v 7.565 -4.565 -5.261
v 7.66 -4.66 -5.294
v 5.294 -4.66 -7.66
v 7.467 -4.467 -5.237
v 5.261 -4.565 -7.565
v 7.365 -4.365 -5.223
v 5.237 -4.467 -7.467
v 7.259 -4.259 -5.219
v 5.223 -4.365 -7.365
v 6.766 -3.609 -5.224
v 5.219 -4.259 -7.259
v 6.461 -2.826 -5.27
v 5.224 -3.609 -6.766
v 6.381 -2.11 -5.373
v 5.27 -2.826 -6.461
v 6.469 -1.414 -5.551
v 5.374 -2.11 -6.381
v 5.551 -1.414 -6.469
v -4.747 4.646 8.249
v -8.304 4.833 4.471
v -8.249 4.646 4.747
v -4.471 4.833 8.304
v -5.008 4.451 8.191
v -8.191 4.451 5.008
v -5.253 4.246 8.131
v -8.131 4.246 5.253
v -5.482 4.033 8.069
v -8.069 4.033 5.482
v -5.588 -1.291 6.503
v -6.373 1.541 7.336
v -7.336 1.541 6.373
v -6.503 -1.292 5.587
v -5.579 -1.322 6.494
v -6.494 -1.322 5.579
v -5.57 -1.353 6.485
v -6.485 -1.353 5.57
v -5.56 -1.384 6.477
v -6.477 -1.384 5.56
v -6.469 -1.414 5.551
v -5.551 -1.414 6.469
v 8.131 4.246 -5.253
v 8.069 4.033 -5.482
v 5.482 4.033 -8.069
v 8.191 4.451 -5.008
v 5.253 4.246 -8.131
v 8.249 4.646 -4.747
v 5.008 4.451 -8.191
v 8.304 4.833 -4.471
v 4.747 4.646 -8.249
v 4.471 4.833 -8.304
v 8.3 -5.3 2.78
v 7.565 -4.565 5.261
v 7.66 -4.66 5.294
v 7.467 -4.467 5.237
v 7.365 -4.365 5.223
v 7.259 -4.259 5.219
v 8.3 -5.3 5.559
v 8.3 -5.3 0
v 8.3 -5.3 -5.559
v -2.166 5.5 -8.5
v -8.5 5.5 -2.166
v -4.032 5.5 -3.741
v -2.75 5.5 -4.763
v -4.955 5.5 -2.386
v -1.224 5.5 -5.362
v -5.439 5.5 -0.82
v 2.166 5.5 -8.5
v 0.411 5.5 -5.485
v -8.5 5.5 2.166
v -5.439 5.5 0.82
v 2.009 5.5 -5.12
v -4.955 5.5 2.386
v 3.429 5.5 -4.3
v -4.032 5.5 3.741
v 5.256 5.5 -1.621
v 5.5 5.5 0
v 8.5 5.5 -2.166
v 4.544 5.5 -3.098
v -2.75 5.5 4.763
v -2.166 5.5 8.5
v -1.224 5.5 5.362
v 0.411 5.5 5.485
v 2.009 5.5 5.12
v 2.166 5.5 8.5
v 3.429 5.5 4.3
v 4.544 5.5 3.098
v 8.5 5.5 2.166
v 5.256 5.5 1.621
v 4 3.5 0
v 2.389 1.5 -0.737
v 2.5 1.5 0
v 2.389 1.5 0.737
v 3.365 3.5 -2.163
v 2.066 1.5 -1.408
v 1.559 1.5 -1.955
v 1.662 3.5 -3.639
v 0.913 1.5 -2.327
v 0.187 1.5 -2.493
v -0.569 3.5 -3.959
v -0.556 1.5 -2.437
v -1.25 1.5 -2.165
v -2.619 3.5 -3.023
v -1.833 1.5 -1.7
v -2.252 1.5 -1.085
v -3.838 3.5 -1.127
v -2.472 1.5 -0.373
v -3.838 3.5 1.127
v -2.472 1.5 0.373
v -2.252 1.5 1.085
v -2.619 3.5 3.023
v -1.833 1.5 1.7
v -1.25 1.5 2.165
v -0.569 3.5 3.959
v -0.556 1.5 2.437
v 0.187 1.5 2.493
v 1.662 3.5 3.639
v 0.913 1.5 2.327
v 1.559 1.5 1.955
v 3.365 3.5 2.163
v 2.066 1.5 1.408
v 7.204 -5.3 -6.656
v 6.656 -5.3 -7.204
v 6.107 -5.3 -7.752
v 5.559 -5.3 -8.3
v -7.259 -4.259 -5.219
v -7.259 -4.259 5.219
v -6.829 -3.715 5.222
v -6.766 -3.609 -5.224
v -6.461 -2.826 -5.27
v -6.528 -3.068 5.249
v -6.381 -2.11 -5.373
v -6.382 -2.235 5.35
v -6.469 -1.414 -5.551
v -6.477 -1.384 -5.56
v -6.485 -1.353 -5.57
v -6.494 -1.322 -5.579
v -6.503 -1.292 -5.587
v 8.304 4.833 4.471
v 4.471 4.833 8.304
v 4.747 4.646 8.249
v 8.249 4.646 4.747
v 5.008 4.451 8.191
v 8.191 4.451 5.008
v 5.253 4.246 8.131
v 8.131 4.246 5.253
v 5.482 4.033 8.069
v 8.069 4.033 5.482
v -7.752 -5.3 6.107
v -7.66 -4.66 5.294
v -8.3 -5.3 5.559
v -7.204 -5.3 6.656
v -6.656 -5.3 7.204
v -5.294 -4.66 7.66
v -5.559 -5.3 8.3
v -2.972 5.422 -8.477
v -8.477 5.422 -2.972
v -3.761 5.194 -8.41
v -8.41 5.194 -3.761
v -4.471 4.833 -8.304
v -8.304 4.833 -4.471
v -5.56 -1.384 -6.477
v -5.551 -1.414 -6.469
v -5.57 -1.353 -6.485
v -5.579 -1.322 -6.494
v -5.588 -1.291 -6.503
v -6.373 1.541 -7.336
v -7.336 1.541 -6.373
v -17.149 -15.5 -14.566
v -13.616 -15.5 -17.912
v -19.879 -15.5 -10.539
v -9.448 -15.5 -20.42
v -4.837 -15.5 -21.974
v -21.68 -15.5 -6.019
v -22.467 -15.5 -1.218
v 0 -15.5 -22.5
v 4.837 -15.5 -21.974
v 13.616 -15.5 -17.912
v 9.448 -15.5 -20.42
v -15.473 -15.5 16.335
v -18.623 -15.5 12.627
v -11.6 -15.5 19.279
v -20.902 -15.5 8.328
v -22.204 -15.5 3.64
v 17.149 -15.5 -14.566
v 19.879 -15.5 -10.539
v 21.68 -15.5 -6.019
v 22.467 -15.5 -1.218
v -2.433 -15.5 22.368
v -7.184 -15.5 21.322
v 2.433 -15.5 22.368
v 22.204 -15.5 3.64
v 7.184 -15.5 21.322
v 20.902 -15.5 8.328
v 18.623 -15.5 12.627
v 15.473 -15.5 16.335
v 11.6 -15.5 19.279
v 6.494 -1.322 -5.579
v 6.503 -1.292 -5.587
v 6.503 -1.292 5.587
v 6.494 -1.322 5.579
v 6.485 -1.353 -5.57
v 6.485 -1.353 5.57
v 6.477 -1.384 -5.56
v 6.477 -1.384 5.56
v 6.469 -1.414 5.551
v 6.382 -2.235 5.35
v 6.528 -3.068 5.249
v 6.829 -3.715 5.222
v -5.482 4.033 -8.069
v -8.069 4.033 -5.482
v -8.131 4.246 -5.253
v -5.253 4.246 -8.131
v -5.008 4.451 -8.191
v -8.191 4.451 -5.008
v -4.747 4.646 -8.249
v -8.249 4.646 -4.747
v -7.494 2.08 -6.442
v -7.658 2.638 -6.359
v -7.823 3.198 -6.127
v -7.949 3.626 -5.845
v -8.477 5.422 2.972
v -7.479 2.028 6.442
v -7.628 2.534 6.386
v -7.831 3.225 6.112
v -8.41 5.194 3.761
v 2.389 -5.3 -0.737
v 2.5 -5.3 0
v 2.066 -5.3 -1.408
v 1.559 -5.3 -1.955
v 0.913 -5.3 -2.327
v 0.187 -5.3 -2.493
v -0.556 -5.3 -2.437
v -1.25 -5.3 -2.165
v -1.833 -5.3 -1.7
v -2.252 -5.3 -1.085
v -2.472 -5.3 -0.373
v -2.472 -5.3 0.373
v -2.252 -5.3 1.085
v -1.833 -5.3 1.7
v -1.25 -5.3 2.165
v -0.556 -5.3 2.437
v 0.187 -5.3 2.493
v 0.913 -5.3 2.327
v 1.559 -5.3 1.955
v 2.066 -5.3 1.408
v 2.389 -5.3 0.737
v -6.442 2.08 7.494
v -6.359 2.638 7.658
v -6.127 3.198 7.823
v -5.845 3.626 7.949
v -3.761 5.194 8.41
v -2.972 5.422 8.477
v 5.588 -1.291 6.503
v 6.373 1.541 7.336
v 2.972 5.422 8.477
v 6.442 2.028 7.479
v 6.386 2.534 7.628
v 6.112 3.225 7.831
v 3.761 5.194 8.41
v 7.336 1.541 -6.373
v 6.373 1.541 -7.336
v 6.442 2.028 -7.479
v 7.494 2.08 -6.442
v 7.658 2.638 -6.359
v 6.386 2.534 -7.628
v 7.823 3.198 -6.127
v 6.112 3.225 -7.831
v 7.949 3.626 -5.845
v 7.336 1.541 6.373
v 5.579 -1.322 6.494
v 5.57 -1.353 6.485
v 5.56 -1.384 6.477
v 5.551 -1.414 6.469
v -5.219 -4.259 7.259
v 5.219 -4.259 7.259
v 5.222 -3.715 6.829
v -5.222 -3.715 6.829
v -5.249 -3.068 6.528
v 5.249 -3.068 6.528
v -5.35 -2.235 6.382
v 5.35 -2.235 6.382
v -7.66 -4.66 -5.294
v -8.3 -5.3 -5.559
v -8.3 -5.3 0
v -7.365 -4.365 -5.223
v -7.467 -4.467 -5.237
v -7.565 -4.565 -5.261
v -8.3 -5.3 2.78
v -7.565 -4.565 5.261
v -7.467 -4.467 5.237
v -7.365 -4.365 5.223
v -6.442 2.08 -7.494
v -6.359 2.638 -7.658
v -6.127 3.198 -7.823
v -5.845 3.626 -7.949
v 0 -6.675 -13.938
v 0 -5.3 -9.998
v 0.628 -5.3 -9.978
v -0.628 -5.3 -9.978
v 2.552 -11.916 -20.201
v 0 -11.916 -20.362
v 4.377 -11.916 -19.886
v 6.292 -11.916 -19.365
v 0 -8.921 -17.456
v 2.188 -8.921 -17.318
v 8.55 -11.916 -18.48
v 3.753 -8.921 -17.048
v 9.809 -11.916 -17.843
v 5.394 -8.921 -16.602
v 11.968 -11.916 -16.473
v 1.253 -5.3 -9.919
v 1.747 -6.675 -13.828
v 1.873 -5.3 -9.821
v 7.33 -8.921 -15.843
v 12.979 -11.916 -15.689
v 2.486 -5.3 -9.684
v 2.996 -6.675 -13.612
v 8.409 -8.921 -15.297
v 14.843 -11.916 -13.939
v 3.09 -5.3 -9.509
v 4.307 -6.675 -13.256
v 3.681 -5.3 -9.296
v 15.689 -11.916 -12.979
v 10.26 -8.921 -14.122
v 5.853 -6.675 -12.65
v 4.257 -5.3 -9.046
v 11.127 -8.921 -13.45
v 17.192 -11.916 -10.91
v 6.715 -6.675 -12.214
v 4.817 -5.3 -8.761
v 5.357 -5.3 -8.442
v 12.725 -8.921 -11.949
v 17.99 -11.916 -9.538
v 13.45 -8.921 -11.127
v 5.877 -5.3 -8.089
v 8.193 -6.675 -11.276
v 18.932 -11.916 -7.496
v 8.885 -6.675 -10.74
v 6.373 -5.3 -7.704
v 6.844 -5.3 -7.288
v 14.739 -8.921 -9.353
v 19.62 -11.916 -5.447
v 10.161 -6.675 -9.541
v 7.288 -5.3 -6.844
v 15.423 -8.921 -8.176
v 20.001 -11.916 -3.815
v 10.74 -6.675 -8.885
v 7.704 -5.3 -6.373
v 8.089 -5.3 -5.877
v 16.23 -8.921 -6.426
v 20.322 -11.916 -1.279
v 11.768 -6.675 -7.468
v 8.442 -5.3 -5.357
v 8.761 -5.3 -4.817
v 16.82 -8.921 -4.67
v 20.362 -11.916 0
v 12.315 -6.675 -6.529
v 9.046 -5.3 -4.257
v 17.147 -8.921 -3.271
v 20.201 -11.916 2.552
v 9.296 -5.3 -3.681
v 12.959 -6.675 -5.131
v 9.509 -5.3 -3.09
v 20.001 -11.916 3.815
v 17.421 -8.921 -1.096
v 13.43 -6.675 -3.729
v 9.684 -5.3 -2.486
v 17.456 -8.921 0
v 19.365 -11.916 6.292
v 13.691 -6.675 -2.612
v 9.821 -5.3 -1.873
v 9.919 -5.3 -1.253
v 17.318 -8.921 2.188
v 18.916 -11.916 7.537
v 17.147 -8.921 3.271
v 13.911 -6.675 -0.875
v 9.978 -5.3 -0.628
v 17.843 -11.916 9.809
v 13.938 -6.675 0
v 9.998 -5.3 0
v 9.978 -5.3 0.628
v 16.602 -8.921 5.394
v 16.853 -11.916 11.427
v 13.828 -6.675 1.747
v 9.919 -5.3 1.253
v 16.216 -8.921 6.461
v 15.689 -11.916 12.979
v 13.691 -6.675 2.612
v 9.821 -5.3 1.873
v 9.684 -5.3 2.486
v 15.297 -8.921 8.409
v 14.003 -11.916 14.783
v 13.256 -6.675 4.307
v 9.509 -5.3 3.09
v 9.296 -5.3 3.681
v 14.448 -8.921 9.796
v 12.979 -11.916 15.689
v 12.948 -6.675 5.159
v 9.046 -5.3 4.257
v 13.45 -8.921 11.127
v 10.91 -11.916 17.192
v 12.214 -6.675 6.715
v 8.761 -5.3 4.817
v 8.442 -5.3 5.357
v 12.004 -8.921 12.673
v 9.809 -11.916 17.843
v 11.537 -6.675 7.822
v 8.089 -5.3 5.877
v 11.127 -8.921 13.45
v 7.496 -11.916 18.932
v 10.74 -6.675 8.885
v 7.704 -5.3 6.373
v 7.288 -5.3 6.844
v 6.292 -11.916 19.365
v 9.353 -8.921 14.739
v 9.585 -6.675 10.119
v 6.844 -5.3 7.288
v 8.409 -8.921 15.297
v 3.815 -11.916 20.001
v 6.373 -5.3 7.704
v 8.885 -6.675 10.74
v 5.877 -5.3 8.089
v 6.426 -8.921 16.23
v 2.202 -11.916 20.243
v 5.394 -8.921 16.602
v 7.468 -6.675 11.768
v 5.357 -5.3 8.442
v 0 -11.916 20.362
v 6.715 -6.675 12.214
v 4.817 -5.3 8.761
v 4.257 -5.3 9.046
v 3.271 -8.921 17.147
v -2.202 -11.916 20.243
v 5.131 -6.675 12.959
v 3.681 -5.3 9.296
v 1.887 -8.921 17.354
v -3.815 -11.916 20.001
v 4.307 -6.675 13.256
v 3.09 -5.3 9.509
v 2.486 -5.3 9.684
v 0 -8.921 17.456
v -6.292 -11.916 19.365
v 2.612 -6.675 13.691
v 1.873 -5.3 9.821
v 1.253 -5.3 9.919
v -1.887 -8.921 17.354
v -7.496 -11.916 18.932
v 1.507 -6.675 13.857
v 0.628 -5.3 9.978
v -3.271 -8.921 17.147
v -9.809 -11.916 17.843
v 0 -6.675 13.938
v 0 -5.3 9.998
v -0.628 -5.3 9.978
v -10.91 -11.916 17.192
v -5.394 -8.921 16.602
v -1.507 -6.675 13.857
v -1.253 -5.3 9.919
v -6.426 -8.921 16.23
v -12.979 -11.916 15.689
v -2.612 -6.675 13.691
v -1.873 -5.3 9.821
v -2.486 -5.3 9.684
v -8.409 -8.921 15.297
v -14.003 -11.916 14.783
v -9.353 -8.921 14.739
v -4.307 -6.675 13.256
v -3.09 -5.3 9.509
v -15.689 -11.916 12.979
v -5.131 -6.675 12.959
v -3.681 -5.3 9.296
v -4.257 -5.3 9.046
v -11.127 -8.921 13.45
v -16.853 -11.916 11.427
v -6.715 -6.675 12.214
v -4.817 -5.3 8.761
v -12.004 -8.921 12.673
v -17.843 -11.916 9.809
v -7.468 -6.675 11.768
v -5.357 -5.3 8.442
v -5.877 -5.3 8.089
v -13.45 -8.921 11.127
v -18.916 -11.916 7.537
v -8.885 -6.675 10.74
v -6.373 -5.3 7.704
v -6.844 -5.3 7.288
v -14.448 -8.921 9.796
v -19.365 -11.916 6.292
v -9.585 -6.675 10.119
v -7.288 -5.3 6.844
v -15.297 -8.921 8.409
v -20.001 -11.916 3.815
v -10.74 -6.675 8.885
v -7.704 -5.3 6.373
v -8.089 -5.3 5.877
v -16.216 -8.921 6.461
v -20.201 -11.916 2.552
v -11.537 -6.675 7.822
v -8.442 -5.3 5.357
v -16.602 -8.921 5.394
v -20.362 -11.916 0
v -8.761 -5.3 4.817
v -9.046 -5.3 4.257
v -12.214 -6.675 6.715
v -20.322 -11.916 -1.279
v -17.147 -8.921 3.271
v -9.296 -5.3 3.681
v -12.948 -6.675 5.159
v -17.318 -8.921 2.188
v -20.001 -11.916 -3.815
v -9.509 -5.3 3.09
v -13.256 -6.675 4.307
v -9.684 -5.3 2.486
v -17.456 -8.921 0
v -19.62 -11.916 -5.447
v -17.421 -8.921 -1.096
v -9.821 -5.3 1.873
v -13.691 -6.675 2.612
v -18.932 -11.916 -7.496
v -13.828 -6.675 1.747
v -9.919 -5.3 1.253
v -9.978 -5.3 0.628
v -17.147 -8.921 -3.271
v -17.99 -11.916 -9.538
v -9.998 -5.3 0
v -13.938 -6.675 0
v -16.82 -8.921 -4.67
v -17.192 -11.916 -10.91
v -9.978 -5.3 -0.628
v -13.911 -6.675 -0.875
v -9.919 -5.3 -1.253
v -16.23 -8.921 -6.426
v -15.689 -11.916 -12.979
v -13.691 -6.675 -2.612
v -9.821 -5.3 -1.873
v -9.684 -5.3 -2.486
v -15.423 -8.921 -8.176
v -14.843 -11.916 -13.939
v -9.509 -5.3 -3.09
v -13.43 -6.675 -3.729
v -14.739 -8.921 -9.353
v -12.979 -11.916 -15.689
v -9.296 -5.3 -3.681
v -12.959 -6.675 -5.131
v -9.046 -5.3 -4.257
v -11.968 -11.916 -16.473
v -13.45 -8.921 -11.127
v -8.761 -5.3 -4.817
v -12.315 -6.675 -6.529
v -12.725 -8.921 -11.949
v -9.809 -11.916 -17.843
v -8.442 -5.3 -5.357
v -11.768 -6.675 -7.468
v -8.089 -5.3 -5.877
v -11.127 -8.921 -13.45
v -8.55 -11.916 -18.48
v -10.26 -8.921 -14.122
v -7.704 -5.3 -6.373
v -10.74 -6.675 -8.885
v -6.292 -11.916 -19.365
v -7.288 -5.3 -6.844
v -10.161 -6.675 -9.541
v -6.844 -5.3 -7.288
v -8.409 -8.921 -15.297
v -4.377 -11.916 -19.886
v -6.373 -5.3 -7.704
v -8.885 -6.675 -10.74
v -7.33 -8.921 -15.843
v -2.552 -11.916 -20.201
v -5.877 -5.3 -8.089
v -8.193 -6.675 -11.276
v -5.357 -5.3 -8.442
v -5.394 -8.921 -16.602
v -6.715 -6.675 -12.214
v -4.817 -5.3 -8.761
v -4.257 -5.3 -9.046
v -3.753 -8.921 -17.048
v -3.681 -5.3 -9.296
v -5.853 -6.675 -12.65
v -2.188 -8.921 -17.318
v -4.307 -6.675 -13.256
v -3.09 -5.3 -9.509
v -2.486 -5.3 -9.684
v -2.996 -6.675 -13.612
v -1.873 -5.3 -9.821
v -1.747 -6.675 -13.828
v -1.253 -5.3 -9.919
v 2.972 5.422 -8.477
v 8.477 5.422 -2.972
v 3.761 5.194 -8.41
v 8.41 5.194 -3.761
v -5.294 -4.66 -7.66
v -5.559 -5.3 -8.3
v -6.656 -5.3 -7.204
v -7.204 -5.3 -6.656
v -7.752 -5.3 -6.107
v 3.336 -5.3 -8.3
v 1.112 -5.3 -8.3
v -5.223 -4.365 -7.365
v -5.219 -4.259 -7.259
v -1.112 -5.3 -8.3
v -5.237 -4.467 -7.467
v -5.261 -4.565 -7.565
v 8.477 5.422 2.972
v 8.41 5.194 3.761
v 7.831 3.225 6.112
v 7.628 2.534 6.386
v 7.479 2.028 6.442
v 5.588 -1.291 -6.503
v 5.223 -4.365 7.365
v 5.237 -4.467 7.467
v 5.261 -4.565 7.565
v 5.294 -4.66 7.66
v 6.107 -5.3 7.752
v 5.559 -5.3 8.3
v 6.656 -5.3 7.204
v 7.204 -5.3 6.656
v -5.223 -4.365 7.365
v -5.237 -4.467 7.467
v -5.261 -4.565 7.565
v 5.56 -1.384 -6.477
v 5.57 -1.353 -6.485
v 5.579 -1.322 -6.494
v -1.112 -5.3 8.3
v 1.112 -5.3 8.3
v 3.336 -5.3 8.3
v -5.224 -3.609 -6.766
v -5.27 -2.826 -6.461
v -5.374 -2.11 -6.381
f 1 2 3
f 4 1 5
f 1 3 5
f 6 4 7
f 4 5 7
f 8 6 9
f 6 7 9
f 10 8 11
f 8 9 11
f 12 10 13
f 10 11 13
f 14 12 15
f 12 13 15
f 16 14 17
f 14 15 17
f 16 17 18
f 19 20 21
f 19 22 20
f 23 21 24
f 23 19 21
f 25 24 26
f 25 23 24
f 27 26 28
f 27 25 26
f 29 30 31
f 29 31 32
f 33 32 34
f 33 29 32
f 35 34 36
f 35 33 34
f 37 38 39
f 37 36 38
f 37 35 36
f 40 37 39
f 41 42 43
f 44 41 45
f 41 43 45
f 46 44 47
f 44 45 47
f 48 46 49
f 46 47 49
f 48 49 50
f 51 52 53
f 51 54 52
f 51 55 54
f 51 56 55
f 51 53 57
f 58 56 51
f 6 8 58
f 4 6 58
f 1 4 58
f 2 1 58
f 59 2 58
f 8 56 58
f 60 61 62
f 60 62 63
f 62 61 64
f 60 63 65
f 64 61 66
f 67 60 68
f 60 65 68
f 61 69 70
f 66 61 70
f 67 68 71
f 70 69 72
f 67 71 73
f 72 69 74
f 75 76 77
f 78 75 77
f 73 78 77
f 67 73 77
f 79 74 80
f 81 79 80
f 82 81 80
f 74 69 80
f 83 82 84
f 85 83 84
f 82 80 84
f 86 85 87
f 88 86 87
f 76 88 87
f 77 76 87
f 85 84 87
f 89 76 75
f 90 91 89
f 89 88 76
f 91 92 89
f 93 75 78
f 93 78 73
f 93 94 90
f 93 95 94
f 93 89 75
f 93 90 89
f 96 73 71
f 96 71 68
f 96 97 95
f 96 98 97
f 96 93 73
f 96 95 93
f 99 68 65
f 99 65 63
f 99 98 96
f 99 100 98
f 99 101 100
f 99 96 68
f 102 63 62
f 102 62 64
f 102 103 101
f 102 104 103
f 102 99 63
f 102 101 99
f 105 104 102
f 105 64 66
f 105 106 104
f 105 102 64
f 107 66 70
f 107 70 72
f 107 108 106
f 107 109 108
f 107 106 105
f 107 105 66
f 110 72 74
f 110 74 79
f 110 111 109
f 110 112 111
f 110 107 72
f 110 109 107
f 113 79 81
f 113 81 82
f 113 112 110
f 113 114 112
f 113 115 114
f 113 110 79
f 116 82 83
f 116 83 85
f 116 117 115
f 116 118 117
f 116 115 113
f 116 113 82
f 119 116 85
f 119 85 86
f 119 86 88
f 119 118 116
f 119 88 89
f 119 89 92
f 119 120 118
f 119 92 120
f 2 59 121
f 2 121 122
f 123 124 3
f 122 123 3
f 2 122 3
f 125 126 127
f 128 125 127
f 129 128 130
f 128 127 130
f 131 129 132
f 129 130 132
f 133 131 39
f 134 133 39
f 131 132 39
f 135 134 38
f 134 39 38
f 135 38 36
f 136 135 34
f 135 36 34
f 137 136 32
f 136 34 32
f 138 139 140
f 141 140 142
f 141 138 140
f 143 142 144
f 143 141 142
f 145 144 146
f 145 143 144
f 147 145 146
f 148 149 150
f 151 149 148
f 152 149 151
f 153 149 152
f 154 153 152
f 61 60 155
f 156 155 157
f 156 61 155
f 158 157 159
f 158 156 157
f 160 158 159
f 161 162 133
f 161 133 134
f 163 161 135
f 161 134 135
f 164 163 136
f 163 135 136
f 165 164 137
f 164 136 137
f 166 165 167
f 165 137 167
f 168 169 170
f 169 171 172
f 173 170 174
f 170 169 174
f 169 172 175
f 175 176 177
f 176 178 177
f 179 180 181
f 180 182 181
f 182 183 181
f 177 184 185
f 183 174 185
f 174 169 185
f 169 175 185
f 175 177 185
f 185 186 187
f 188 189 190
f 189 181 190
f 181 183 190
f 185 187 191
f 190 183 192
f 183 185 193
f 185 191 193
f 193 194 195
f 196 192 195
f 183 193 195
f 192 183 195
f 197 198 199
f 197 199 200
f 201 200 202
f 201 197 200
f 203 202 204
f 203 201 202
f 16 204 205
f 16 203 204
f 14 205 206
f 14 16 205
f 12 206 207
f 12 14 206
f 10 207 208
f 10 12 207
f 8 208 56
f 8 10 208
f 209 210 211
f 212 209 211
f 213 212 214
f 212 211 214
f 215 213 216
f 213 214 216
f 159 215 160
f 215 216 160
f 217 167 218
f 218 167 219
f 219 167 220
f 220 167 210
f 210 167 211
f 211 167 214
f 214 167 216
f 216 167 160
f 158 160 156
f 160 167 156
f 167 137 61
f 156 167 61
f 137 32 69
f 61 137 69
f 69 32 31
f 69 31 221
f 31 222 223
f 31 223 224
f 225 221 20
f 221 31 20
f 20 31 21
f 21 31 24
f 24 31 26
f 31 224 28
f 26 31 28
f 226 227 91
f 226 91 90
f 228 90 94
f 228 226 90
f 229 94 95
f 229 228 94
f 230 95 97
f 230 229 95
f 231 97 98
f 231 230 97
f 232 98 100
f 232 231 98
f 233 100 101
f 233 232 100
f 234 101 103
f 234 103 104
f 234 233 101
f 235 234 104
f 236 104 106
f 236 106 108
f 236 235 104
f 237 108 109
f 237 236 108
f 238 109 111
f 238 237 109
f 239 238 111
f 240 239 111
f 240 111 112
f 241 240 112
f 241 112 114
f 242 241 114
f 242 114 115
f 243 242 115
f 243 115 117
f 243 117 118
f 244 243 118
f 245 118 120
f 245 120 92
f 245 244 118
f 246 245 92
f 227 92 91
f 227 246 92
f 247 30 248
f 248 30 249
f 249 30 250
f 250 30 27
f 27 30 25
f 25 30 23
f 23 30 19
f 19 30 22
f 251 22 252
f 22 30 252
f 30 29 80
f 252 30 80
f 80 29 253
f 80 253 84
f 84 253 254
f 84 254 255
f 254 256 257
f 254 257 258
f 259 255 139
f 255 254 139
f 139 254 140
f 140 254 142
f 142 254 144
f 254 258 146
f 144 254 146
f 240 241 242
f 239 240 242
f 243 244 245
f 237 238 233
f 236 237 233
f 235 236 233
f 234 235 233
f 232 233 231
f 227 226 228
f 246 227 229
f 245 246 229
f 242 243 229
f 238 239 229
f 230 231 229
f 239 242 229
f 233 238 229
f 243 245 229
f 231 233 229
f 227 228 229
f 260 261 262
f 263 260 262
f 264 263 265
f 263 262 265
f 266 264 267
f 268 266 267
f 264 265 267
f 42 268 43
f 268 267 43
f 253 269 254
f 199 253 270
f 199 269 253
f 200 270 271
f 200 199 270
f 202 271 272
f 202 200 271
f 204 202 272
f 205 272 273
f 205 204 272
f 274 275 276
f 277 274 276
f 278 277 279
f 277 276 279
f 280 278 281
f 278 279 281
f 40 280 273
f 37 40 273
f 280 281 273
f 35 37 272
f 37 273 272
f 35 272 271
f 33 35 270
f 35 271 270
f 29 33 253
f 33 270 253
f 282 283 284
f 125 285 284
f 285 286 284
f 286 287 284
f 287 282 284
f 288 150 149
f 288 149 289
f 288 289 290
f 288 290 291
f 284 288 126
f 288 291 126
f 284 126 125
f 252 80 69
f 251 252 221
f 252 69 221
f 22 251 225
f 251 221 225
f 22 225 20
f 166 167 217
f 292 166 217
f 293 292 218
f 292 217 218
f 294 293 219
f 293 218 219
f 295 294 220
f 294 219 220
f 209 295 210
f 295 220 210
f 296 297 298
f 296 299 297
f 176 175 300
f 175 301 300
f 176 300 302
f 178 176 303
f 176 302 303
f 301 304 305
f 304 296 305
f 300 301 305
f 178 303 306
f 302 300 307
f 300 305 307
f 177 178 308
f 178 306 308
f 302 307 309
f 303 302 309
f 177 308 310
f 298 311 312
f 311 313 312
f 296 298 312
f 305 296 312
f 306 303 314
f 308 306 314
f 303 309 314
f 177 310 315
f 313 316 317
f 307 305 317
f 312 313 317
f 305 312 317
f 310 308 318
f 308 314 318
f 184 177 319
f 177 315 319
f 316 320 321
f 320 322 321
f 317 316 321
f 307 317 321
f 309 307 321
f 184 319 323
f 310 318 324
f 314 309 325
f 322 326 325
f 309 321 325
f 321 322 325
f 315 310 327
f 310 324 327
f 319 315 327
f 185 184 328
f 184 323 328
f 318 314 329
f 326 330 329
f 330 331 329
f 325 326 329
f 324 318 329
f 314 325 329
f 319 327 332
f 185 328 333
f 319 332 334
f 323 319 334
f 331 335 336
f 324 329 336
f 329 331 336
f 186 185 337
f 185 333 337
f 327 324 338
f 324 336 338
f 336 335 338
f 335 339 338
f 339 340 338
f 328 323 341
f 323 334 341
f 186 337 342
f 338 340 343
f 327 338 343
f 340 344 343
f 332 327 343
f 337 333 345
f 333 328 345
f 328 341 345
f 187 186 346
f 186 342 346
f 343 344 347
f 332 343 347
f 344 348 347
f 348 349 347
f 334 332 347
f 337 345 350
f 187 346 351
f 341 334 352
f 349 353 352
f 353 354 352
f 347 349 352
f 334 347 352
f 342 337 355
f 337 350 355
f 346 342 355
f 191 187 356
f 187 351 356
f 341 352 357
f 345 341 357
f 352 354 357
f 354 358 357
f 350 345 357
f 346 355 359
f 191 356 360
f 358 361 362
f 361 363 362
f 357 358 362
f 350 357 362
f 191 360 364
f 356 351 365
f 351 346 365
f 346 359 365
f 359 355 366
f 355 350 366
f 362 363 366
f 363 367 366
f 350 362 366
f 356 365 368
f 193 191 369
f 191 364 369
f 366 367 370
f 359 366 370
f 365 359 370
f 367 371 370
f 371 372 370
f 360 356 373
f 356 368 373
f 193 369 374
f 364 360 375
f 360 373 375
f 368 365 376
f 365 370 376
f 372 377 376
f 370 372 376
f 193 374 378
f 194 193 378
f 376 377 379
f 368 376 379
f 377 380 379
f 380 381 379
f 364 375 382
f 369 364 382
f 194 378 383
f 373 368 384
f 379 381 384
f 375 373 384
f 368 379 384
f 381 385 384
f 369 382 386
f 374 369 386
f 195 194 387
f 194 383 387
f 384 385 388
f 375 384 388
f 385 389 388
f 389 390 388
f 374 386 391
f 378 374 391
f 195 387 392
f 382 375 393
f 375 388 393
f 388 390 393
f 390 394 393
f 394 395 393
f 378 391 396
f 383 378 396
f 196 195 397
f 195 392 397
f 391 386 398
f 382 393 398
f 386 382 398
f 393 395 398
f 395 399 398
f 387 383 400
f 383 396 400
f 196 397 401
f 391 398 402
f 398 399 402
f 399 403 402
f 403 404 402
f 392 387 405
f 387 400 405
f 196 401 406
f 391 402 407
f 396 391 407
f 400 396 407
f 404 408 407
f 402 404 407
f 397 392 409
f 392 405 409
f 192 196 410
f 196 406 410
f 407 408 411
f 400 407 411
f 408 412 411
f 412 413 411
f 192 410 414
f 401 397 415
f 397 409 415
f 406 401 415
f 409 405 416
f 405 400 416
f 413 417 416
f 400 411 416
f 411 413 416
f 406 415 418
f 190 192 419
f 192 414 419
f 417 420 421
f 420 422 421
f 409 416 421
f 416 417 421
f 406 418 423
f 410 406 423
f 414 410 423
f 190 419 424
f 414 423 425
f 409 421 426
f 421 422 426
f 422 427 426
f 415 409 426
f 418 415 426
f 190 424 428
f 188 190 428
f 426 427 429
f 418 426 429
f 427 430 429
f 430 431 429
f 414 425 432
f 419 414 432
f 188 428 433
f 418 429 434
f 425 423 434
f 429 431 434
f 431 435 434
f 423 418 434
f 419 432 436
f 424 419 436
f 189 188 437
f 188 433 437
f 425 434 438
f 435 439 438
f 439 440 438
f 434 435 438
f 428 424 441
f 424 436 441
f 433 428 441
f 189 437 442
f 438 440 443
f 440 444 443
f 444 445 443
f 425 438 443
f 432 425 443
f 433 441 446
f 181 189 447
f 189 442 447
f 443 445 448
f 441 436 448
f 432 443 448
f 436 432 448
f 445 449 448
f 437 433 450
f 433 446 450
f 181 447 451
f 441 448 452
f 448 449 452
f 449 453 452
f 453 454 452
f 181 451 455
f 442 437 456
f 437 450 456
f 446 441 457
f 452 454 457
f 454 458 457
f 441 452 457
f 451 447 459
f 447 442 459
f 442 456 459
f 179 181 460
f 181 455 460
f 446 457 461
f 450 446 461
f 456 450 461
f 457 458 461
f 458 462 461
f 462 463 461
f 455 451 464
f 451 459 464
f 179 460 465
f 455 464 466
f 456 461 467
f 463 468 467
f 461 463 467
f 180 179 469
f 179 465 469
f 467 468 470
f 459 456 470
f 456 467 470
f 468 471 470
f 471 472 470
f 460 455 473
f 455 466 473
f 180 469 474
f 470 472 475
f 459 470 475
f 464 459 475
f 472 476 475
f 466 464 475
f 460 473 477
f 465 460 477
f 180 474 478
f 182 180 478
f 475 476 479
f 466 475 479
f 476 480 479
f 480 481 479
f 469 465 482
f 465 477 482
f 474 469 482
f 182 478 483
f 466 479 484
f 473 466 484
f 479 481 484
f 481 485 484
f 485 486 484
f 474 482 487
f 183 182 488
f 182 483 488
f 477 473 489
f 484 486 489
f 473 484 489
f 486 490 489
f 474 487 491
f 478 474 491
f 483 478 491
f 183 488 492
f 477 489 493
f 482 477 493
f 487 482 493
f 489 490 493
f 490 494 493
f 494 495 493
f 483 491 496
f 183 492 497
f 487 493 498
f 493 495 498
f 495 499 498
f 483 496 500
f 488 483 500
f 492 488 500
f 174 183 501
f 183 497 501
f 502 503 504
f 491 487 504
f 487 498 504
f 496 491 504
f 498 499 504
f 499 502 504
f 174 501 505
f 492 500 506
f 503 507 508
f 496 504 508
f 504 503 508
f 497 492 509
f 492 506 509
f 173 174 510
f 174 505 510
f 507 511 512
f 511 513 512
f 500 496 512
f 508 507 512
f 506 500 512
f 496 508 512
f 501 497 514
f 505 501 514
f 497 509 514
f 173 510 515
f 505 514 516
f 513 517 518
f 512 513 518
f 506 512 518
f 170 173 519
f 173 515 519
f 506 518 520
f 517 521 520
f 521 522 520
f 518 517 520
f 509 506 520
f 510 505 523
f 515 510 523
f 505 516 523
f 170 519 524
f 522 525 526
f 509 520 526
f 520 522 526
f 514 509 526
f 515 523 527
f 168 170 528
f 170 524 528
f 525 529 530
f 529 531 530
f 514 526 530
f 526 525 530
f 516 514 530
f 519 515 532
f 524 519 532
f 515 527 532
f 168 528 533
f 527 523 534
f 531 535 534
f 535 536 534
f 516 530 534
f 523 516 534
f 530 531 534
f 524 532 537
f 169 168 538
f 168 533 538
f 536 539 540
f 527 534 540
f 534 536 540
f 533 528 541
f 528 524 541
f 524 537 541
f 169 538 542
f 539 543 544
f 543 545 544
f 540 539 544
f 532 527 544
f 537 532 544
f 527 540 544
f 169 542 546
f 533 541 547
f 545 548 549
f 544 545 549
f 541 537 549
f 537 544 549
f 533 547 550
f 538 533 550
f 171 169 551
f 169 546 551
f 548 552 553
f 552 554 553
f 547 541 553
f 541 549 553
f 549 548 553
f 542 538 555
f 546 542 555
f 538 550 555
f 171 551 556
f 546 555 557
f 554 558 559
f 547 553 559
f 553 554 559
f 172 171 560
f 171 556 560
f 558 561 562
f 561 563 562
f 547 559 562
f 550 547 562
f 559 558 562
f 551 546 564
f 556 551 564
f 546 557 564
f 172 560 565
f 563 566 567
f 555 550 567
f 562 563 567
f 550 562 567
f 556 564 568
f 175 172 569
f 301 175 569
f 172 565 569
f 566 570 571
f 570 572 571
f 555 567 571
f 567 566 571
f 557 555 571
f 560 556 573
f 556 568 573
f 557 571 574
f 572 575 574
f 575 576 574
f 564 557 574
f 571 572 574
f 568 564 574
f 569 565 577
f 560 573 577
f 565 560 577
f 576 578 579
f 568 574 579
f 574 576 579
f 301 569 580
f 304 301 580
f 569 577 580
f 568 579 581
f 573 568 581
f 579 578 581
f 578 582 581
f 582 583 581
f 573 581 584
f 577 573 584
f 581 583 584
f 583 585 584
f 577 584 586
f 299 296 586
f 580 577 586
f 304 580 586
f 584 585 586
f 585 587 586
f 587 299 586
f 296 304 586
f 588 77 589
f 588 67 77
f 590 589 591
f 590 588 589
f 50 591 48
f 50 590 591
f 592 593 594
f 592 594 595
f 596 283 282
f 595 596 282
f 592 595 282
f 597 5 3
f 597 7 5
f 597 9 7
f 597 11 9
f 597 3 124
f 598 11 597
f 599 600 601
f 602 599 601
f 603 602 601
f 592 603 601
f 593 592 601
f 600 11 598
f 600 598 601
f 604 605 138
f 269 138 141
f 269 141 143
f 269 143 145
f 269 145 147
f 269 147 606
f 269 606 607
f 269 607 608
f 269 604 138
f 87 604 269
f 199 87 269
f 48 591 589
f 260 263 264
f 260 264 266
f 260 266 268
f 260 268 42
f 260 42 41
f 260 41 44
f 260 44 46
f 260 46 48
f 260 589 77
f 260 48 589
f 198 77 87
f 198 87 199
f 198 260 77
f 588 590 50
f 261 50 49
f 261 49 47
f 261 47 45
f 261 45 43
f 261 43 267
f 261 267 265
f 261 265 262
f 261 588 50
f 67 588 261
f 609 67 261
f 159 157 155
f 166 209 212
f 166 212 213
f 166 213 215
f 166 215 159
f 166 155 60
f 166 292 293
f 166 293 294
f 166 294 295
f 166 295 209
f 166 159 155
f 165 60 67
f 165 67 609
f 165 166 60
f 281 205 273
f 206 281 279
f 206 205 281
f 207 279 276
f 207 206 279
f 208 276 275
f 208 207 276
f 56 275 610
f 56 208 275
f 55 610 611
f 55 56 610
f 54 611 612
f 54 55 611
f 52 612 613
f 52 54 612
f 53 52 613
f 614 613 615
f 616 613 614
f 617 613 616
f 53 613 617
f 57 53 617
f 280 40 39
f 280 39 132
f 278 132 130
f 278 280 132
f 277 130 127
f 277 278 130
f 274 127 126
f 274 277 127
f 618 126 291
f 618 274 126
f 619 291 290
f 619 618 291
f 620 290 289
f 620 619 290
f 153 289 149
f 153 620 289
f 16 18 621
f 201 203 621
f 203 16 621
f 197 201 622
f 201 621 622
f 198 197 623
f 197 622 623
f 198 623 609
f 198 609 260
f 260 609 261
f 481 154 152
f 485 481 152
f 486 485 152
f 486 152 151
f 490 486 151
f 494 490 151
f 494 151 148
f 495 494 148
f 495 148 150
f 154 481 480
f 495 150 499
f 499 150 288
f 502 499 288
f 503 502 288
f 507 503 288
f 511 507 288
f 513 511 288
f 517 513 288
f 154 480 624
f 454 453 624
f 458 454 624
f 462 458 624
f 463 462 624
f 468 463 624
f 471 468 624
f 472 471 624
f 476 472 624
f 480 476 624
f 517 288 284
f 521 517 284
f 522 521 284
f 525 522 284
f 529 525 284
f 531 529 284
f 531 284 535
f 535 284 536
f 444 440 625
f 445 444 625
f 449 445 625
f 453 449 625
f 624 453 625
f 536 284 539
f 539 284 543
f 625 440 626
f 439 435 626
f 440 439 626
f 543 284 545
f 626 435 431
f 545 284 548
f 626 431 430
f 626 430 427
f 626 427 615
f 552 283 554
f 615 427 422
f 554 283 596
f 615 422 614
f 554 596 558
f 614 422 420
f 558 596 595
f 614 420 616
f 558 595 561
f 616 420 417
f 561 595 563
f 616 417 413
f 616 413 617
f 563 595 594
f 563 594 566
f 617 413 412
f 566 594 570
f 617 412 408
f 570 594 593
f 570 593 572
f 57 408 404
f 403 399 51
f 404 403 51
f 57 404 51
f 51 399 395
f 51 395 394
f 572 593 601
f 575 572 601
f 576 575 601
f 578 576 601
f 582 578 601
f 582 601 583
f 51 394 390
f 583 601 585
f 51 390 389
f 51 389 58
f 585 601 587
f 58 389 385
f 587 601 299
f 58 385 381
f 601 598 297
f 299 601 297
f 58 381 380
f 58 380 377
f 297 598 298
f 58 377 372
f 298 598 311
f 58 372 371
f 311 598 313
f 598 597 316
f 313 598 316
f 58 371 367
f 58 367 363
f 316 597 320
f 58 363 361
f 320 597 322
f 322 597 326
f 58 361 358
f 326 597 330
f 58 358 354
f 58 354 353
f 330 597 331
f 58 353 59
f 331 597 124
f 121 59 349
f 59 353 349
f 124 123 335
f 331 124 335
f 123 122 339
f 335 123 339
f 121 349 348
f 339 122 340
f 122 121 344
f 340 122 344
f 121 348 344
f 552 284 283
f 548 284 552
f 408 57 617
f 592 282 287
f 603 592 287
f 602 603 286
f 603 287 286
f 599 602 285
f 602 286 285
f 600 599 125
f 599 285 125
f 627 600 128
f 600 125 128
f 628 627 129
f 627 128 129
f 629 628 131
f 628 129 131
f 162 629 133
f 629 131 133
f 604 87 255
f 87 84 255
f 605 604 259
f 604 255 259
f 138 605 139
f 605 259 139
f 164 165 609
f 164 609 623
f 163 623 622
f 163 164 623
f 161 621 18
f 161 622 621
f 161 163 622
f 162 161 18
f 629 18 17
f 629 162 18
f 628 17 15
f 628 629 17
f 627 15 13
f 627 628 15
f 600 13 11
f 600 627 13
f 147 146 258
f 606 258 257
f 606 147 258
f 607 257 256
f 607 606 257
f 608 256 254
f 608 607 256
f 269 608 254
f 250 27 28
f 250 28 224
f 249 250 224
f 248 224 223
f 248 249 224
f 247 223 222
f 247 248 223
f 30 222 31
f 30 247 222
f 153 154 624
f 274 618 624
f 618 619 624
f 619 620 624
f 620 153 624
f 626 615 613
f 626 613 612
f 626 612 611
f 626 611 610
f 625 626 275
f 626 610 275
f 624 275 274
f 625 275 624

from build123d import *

# Parameters (mm, degrees)
SKETCH4_W           = 17
SKETCH4_H           = 11
BOSS_EXTRUDE2_DEPTH = 8.5
CUT_EXTRUDE1_DEPTH  = 13.5
CUT_EXTRUDE2_DEPTH  = 13.5
CUT_EXTRUDE3_DEPTH  = 13.5
CUT_EXTRUDE4_DEPTH  = 13.5
FILLET1_R           = 2


with BuildPart() as part:
    # Sketch4 → Boss-Extrude2 (new body, symmetric)
    with BuildSketch(Plane.XY):
        Rectangle(SKETCH4_W, SKETCH4_H)
    extrude(amount=BOSS_EXTRUDE2_DEPTH, both=True)

    # Sketch5 → Cut-Extrude1 (cut, symmetric)
    with BuildSketch(Plane(origin=(0, 0, 0), x_dir=(0, 0, -1), z_dir=(1, 0, 0))):
        with BuildLine():
            Line((8.5, 5.5), (6.502509808, -1.291466653))
            ThreePointArc((6.502509808, -1.291466653), (6.473626767, -2.879228009), (7.259285969, -4.259285969))
            Line((7.259285969, -4.259285969), (8.5, -5.5))
            Line((8.5, -5.5), (8.5, 5.5))
        make_face()
        with BuildLine():
            Line((-8.5, -5.5), (-7.259285969, -4.259285969))
            ThreePointArc((-7.259285969, -4.259285969), (-6.473626767, -2.879228009), (-6.502509808, -1.291466653))
            Line((-6.502509808, -1.291466653), (-8.5, 5.5))
            Line((-8.5, 5.5), (-8.5, -5.5))
        make_face()
    extrude(amount=CUT_EXTRUDE1_DEPTH, both=True, mode=Mode.SUBTRACT)

    # Sketch7 → Cut-Extrude2 (cut, symmetric)
    with BuildSketch(Plane.XY):
        with BuildLine():
            Line((8.5, 5.5), (6.502538332, -1.291517059))
            ThreePointArc((6.502538332, -1.291517059), (6.473662442, -2.879270046), (7.259319467, -4.259319467))
            Line((7.259319467, -4.259319467), (8.5, -5.5))
            Line((8.5, -5.5), (8.5, 5.5))
        make_face()
        with BuildLine():
            Line((-8.5, -5.5), (-7.259319467, -4.259319467))
            ThreePointArc((-7.259319467, -4.259319467), (-6.473662442, -2.879270046), (-6.502538332, -1.291517059))
            Line((-6.502538332, -1.291517059), (-8.5, 5.5))
            Line((-8.5, 5.5), (-8.5, -5.5))
        make_face()
    extrude(amount=CUT_EXTRUDE2_DEPTH, both=True, mode=Mode.SUBTRACT)

    # Sketch11 → Cut-Extrude3 (cut, symmetric)
    with BuildSketch(Plane(origin=(0, 0, 0), x_dir=(0.707106781, 0, -0.707106781), z_dir=(0.707106781, 0, 0.707106781))):
        with BuildLine():
            Line((10, -5.5), (9.159523089, -4.659523089))
            ThreePointArc((9.159523089, -4.659523089), (8.341069319, -3.136306549), (8.499291869, -1.414382965))
            Line((8.499291869, -1.414382965), (9.693462893, 1.541294037))
            ThreePointArc((9.693462893, 1.541294037), (9.908907559, 2.799328578), (9.581873492, 4.033069244))
            ThreePointArc((9.581873492, 4.033069244), (9.013209006, 4.854851227), (8.25, 5.5))
            Line((8.25, 5.5), (14, 5.5))
            Line((14, 5.5), (14, -5.5))
            Line((14, -5.5), (10, -5.5))
        make_face()
        with BuildLine():
            Line((-14, 5.5), (-8.25, 5.5))
            ThreePointArc((-8.25, 5.5), (-9.013209006, 4.854851227), (-9.581873492, 4.033069244))
            ThreePointArc((-9.581873492, 4.033069244), (-9.908907559, 2.799328578), (-9.693462893, 1.541294037))
            Line((-9.693462893, 1.541294037), (-8.499291869, -1.414382965))
            ThreePointArc((-8.499291869, -1.414382965), (-8.341069319, -3.136306549), (-9.159523089, -4.659523089))
            Line((-9.159523089, -4.659523089), (-10, -5.5))
            Line((-10, -5.5), (-14, -5.5))
            Line((-14, -5.5), (-14, 5.5))
        make_face()
    extrude(amount=CUT_EXTRUDE3_DEPTH, both=True, mode=Mode.SUBTRACT)

    # Sketch12 → Cut-Extrude4 (cut, symmetric)
    with BuildSketch(Plane(origin=(0, 0, 0), x_dir=(-0.707106781, 0, -0.707106781), z_dir=(0.707106781, 0, -0.707106781))):
        with BuildLine():
            Line((10, -5.5), (9.159523089, -4.659523089))
            ThreePointArc((9.159523089, -4.659523089), (8.341069319, -3.136306549), (8.499291869, -1.414382965))
            Line((8.499291869, -1.414382965), (9.693462893, 1.541294037))
            ThreePointArc((9.693462893, 1.541294037), (9.908907559, 2.799328578), (9.581873492, 4.033069244))
            ThreePointArc((9.581873492, 4.033069244), (9.013209006, 4.854851227), (8.25, 5.5))
            Line((8.25, 5.5), (14, 5.5))
            Line((14, 5.5), (14, -5.5))
            Line((14, -5.5), (10, -5.5))
        make_face()
        with BuildLine():
            Line((-14, 5.5), (-8.25, 5.5))
            ThreePointArc((-8.25, 5.5), (-9.013209006, 4.854851227), (-9.581873492, 4.033069244))
            ThreePointArc((-9.581873492, 4.033069244), (-9.908907559, 2.799328578), (-9.693462893, 1.541294037))
            Line((-9.693462893, 1.541294037), (-8.499291869, -1.414382965))
            ThreePointArc((-8.499291869, -1.414382965), (-8.341069319, -3.136306549), (-9.159523089, -4.659523089))
            Line((-9.159523089, -4.659523089), (-10, -5.5))
            Line((-10, -5.5), (-14, -5.5))
            Line((-14, -5.5), (-14, 5.5))
        make_face()
    extrude(amount=CUT_EXTRUDE4_DEPTH, both=True, mode=Mode.SUBTRACT)

    # Sketch14 → Cut-Revolve1 (revolve, cut)
    with BuildSketch(Plane.XY):
        Polygon((0, 5.5), (5.5, 5.5), (2.5, 1.5), (2.5, -5.5), (0, -5.5), align=None)
    revolve(axis=Axis((0, -5.5, 0), (0, 1, 0)), mode=Mode.SUBTRACT)

    # Fillet1
    fillet1_edges = [part.edges().sort_by_distance(p)[0] for p in [
        (5.833630945, 5.5, -5.833630945),
        (-5.833630945, 5.5, -5.833630945),
        (-5.833630945, 5.5, 5.833630945),
        (5.833630945, 5.5, 5.833630945),
    ]]
    fillet(fillet1_edges, radius=FILLET1_R)

    # Sketch15 → Revolve1 (revolve)
    with BuildSketch(Plane(origin=(0, 0, 0), x_dir=(0, 0, -1), z_dir=(1, 0, 0))):
        with BuildLine():
            Line((0, -15.5), (22.5, -15.5))
            ThreePointArc((22.5, -15.5), (17.455904629, -8.920713416), (9.9979998, -5.3))
            Line((9.9979998, -5.3), (0, -5.3))
            Line((0, -5.3), (0, -5.5))
            Line((0, -5.5), (0, -15.5))
        make_face()
    revolve(axis=Axis((0, -5.5, 0), (0, -1, 0)))


solid = part.part
